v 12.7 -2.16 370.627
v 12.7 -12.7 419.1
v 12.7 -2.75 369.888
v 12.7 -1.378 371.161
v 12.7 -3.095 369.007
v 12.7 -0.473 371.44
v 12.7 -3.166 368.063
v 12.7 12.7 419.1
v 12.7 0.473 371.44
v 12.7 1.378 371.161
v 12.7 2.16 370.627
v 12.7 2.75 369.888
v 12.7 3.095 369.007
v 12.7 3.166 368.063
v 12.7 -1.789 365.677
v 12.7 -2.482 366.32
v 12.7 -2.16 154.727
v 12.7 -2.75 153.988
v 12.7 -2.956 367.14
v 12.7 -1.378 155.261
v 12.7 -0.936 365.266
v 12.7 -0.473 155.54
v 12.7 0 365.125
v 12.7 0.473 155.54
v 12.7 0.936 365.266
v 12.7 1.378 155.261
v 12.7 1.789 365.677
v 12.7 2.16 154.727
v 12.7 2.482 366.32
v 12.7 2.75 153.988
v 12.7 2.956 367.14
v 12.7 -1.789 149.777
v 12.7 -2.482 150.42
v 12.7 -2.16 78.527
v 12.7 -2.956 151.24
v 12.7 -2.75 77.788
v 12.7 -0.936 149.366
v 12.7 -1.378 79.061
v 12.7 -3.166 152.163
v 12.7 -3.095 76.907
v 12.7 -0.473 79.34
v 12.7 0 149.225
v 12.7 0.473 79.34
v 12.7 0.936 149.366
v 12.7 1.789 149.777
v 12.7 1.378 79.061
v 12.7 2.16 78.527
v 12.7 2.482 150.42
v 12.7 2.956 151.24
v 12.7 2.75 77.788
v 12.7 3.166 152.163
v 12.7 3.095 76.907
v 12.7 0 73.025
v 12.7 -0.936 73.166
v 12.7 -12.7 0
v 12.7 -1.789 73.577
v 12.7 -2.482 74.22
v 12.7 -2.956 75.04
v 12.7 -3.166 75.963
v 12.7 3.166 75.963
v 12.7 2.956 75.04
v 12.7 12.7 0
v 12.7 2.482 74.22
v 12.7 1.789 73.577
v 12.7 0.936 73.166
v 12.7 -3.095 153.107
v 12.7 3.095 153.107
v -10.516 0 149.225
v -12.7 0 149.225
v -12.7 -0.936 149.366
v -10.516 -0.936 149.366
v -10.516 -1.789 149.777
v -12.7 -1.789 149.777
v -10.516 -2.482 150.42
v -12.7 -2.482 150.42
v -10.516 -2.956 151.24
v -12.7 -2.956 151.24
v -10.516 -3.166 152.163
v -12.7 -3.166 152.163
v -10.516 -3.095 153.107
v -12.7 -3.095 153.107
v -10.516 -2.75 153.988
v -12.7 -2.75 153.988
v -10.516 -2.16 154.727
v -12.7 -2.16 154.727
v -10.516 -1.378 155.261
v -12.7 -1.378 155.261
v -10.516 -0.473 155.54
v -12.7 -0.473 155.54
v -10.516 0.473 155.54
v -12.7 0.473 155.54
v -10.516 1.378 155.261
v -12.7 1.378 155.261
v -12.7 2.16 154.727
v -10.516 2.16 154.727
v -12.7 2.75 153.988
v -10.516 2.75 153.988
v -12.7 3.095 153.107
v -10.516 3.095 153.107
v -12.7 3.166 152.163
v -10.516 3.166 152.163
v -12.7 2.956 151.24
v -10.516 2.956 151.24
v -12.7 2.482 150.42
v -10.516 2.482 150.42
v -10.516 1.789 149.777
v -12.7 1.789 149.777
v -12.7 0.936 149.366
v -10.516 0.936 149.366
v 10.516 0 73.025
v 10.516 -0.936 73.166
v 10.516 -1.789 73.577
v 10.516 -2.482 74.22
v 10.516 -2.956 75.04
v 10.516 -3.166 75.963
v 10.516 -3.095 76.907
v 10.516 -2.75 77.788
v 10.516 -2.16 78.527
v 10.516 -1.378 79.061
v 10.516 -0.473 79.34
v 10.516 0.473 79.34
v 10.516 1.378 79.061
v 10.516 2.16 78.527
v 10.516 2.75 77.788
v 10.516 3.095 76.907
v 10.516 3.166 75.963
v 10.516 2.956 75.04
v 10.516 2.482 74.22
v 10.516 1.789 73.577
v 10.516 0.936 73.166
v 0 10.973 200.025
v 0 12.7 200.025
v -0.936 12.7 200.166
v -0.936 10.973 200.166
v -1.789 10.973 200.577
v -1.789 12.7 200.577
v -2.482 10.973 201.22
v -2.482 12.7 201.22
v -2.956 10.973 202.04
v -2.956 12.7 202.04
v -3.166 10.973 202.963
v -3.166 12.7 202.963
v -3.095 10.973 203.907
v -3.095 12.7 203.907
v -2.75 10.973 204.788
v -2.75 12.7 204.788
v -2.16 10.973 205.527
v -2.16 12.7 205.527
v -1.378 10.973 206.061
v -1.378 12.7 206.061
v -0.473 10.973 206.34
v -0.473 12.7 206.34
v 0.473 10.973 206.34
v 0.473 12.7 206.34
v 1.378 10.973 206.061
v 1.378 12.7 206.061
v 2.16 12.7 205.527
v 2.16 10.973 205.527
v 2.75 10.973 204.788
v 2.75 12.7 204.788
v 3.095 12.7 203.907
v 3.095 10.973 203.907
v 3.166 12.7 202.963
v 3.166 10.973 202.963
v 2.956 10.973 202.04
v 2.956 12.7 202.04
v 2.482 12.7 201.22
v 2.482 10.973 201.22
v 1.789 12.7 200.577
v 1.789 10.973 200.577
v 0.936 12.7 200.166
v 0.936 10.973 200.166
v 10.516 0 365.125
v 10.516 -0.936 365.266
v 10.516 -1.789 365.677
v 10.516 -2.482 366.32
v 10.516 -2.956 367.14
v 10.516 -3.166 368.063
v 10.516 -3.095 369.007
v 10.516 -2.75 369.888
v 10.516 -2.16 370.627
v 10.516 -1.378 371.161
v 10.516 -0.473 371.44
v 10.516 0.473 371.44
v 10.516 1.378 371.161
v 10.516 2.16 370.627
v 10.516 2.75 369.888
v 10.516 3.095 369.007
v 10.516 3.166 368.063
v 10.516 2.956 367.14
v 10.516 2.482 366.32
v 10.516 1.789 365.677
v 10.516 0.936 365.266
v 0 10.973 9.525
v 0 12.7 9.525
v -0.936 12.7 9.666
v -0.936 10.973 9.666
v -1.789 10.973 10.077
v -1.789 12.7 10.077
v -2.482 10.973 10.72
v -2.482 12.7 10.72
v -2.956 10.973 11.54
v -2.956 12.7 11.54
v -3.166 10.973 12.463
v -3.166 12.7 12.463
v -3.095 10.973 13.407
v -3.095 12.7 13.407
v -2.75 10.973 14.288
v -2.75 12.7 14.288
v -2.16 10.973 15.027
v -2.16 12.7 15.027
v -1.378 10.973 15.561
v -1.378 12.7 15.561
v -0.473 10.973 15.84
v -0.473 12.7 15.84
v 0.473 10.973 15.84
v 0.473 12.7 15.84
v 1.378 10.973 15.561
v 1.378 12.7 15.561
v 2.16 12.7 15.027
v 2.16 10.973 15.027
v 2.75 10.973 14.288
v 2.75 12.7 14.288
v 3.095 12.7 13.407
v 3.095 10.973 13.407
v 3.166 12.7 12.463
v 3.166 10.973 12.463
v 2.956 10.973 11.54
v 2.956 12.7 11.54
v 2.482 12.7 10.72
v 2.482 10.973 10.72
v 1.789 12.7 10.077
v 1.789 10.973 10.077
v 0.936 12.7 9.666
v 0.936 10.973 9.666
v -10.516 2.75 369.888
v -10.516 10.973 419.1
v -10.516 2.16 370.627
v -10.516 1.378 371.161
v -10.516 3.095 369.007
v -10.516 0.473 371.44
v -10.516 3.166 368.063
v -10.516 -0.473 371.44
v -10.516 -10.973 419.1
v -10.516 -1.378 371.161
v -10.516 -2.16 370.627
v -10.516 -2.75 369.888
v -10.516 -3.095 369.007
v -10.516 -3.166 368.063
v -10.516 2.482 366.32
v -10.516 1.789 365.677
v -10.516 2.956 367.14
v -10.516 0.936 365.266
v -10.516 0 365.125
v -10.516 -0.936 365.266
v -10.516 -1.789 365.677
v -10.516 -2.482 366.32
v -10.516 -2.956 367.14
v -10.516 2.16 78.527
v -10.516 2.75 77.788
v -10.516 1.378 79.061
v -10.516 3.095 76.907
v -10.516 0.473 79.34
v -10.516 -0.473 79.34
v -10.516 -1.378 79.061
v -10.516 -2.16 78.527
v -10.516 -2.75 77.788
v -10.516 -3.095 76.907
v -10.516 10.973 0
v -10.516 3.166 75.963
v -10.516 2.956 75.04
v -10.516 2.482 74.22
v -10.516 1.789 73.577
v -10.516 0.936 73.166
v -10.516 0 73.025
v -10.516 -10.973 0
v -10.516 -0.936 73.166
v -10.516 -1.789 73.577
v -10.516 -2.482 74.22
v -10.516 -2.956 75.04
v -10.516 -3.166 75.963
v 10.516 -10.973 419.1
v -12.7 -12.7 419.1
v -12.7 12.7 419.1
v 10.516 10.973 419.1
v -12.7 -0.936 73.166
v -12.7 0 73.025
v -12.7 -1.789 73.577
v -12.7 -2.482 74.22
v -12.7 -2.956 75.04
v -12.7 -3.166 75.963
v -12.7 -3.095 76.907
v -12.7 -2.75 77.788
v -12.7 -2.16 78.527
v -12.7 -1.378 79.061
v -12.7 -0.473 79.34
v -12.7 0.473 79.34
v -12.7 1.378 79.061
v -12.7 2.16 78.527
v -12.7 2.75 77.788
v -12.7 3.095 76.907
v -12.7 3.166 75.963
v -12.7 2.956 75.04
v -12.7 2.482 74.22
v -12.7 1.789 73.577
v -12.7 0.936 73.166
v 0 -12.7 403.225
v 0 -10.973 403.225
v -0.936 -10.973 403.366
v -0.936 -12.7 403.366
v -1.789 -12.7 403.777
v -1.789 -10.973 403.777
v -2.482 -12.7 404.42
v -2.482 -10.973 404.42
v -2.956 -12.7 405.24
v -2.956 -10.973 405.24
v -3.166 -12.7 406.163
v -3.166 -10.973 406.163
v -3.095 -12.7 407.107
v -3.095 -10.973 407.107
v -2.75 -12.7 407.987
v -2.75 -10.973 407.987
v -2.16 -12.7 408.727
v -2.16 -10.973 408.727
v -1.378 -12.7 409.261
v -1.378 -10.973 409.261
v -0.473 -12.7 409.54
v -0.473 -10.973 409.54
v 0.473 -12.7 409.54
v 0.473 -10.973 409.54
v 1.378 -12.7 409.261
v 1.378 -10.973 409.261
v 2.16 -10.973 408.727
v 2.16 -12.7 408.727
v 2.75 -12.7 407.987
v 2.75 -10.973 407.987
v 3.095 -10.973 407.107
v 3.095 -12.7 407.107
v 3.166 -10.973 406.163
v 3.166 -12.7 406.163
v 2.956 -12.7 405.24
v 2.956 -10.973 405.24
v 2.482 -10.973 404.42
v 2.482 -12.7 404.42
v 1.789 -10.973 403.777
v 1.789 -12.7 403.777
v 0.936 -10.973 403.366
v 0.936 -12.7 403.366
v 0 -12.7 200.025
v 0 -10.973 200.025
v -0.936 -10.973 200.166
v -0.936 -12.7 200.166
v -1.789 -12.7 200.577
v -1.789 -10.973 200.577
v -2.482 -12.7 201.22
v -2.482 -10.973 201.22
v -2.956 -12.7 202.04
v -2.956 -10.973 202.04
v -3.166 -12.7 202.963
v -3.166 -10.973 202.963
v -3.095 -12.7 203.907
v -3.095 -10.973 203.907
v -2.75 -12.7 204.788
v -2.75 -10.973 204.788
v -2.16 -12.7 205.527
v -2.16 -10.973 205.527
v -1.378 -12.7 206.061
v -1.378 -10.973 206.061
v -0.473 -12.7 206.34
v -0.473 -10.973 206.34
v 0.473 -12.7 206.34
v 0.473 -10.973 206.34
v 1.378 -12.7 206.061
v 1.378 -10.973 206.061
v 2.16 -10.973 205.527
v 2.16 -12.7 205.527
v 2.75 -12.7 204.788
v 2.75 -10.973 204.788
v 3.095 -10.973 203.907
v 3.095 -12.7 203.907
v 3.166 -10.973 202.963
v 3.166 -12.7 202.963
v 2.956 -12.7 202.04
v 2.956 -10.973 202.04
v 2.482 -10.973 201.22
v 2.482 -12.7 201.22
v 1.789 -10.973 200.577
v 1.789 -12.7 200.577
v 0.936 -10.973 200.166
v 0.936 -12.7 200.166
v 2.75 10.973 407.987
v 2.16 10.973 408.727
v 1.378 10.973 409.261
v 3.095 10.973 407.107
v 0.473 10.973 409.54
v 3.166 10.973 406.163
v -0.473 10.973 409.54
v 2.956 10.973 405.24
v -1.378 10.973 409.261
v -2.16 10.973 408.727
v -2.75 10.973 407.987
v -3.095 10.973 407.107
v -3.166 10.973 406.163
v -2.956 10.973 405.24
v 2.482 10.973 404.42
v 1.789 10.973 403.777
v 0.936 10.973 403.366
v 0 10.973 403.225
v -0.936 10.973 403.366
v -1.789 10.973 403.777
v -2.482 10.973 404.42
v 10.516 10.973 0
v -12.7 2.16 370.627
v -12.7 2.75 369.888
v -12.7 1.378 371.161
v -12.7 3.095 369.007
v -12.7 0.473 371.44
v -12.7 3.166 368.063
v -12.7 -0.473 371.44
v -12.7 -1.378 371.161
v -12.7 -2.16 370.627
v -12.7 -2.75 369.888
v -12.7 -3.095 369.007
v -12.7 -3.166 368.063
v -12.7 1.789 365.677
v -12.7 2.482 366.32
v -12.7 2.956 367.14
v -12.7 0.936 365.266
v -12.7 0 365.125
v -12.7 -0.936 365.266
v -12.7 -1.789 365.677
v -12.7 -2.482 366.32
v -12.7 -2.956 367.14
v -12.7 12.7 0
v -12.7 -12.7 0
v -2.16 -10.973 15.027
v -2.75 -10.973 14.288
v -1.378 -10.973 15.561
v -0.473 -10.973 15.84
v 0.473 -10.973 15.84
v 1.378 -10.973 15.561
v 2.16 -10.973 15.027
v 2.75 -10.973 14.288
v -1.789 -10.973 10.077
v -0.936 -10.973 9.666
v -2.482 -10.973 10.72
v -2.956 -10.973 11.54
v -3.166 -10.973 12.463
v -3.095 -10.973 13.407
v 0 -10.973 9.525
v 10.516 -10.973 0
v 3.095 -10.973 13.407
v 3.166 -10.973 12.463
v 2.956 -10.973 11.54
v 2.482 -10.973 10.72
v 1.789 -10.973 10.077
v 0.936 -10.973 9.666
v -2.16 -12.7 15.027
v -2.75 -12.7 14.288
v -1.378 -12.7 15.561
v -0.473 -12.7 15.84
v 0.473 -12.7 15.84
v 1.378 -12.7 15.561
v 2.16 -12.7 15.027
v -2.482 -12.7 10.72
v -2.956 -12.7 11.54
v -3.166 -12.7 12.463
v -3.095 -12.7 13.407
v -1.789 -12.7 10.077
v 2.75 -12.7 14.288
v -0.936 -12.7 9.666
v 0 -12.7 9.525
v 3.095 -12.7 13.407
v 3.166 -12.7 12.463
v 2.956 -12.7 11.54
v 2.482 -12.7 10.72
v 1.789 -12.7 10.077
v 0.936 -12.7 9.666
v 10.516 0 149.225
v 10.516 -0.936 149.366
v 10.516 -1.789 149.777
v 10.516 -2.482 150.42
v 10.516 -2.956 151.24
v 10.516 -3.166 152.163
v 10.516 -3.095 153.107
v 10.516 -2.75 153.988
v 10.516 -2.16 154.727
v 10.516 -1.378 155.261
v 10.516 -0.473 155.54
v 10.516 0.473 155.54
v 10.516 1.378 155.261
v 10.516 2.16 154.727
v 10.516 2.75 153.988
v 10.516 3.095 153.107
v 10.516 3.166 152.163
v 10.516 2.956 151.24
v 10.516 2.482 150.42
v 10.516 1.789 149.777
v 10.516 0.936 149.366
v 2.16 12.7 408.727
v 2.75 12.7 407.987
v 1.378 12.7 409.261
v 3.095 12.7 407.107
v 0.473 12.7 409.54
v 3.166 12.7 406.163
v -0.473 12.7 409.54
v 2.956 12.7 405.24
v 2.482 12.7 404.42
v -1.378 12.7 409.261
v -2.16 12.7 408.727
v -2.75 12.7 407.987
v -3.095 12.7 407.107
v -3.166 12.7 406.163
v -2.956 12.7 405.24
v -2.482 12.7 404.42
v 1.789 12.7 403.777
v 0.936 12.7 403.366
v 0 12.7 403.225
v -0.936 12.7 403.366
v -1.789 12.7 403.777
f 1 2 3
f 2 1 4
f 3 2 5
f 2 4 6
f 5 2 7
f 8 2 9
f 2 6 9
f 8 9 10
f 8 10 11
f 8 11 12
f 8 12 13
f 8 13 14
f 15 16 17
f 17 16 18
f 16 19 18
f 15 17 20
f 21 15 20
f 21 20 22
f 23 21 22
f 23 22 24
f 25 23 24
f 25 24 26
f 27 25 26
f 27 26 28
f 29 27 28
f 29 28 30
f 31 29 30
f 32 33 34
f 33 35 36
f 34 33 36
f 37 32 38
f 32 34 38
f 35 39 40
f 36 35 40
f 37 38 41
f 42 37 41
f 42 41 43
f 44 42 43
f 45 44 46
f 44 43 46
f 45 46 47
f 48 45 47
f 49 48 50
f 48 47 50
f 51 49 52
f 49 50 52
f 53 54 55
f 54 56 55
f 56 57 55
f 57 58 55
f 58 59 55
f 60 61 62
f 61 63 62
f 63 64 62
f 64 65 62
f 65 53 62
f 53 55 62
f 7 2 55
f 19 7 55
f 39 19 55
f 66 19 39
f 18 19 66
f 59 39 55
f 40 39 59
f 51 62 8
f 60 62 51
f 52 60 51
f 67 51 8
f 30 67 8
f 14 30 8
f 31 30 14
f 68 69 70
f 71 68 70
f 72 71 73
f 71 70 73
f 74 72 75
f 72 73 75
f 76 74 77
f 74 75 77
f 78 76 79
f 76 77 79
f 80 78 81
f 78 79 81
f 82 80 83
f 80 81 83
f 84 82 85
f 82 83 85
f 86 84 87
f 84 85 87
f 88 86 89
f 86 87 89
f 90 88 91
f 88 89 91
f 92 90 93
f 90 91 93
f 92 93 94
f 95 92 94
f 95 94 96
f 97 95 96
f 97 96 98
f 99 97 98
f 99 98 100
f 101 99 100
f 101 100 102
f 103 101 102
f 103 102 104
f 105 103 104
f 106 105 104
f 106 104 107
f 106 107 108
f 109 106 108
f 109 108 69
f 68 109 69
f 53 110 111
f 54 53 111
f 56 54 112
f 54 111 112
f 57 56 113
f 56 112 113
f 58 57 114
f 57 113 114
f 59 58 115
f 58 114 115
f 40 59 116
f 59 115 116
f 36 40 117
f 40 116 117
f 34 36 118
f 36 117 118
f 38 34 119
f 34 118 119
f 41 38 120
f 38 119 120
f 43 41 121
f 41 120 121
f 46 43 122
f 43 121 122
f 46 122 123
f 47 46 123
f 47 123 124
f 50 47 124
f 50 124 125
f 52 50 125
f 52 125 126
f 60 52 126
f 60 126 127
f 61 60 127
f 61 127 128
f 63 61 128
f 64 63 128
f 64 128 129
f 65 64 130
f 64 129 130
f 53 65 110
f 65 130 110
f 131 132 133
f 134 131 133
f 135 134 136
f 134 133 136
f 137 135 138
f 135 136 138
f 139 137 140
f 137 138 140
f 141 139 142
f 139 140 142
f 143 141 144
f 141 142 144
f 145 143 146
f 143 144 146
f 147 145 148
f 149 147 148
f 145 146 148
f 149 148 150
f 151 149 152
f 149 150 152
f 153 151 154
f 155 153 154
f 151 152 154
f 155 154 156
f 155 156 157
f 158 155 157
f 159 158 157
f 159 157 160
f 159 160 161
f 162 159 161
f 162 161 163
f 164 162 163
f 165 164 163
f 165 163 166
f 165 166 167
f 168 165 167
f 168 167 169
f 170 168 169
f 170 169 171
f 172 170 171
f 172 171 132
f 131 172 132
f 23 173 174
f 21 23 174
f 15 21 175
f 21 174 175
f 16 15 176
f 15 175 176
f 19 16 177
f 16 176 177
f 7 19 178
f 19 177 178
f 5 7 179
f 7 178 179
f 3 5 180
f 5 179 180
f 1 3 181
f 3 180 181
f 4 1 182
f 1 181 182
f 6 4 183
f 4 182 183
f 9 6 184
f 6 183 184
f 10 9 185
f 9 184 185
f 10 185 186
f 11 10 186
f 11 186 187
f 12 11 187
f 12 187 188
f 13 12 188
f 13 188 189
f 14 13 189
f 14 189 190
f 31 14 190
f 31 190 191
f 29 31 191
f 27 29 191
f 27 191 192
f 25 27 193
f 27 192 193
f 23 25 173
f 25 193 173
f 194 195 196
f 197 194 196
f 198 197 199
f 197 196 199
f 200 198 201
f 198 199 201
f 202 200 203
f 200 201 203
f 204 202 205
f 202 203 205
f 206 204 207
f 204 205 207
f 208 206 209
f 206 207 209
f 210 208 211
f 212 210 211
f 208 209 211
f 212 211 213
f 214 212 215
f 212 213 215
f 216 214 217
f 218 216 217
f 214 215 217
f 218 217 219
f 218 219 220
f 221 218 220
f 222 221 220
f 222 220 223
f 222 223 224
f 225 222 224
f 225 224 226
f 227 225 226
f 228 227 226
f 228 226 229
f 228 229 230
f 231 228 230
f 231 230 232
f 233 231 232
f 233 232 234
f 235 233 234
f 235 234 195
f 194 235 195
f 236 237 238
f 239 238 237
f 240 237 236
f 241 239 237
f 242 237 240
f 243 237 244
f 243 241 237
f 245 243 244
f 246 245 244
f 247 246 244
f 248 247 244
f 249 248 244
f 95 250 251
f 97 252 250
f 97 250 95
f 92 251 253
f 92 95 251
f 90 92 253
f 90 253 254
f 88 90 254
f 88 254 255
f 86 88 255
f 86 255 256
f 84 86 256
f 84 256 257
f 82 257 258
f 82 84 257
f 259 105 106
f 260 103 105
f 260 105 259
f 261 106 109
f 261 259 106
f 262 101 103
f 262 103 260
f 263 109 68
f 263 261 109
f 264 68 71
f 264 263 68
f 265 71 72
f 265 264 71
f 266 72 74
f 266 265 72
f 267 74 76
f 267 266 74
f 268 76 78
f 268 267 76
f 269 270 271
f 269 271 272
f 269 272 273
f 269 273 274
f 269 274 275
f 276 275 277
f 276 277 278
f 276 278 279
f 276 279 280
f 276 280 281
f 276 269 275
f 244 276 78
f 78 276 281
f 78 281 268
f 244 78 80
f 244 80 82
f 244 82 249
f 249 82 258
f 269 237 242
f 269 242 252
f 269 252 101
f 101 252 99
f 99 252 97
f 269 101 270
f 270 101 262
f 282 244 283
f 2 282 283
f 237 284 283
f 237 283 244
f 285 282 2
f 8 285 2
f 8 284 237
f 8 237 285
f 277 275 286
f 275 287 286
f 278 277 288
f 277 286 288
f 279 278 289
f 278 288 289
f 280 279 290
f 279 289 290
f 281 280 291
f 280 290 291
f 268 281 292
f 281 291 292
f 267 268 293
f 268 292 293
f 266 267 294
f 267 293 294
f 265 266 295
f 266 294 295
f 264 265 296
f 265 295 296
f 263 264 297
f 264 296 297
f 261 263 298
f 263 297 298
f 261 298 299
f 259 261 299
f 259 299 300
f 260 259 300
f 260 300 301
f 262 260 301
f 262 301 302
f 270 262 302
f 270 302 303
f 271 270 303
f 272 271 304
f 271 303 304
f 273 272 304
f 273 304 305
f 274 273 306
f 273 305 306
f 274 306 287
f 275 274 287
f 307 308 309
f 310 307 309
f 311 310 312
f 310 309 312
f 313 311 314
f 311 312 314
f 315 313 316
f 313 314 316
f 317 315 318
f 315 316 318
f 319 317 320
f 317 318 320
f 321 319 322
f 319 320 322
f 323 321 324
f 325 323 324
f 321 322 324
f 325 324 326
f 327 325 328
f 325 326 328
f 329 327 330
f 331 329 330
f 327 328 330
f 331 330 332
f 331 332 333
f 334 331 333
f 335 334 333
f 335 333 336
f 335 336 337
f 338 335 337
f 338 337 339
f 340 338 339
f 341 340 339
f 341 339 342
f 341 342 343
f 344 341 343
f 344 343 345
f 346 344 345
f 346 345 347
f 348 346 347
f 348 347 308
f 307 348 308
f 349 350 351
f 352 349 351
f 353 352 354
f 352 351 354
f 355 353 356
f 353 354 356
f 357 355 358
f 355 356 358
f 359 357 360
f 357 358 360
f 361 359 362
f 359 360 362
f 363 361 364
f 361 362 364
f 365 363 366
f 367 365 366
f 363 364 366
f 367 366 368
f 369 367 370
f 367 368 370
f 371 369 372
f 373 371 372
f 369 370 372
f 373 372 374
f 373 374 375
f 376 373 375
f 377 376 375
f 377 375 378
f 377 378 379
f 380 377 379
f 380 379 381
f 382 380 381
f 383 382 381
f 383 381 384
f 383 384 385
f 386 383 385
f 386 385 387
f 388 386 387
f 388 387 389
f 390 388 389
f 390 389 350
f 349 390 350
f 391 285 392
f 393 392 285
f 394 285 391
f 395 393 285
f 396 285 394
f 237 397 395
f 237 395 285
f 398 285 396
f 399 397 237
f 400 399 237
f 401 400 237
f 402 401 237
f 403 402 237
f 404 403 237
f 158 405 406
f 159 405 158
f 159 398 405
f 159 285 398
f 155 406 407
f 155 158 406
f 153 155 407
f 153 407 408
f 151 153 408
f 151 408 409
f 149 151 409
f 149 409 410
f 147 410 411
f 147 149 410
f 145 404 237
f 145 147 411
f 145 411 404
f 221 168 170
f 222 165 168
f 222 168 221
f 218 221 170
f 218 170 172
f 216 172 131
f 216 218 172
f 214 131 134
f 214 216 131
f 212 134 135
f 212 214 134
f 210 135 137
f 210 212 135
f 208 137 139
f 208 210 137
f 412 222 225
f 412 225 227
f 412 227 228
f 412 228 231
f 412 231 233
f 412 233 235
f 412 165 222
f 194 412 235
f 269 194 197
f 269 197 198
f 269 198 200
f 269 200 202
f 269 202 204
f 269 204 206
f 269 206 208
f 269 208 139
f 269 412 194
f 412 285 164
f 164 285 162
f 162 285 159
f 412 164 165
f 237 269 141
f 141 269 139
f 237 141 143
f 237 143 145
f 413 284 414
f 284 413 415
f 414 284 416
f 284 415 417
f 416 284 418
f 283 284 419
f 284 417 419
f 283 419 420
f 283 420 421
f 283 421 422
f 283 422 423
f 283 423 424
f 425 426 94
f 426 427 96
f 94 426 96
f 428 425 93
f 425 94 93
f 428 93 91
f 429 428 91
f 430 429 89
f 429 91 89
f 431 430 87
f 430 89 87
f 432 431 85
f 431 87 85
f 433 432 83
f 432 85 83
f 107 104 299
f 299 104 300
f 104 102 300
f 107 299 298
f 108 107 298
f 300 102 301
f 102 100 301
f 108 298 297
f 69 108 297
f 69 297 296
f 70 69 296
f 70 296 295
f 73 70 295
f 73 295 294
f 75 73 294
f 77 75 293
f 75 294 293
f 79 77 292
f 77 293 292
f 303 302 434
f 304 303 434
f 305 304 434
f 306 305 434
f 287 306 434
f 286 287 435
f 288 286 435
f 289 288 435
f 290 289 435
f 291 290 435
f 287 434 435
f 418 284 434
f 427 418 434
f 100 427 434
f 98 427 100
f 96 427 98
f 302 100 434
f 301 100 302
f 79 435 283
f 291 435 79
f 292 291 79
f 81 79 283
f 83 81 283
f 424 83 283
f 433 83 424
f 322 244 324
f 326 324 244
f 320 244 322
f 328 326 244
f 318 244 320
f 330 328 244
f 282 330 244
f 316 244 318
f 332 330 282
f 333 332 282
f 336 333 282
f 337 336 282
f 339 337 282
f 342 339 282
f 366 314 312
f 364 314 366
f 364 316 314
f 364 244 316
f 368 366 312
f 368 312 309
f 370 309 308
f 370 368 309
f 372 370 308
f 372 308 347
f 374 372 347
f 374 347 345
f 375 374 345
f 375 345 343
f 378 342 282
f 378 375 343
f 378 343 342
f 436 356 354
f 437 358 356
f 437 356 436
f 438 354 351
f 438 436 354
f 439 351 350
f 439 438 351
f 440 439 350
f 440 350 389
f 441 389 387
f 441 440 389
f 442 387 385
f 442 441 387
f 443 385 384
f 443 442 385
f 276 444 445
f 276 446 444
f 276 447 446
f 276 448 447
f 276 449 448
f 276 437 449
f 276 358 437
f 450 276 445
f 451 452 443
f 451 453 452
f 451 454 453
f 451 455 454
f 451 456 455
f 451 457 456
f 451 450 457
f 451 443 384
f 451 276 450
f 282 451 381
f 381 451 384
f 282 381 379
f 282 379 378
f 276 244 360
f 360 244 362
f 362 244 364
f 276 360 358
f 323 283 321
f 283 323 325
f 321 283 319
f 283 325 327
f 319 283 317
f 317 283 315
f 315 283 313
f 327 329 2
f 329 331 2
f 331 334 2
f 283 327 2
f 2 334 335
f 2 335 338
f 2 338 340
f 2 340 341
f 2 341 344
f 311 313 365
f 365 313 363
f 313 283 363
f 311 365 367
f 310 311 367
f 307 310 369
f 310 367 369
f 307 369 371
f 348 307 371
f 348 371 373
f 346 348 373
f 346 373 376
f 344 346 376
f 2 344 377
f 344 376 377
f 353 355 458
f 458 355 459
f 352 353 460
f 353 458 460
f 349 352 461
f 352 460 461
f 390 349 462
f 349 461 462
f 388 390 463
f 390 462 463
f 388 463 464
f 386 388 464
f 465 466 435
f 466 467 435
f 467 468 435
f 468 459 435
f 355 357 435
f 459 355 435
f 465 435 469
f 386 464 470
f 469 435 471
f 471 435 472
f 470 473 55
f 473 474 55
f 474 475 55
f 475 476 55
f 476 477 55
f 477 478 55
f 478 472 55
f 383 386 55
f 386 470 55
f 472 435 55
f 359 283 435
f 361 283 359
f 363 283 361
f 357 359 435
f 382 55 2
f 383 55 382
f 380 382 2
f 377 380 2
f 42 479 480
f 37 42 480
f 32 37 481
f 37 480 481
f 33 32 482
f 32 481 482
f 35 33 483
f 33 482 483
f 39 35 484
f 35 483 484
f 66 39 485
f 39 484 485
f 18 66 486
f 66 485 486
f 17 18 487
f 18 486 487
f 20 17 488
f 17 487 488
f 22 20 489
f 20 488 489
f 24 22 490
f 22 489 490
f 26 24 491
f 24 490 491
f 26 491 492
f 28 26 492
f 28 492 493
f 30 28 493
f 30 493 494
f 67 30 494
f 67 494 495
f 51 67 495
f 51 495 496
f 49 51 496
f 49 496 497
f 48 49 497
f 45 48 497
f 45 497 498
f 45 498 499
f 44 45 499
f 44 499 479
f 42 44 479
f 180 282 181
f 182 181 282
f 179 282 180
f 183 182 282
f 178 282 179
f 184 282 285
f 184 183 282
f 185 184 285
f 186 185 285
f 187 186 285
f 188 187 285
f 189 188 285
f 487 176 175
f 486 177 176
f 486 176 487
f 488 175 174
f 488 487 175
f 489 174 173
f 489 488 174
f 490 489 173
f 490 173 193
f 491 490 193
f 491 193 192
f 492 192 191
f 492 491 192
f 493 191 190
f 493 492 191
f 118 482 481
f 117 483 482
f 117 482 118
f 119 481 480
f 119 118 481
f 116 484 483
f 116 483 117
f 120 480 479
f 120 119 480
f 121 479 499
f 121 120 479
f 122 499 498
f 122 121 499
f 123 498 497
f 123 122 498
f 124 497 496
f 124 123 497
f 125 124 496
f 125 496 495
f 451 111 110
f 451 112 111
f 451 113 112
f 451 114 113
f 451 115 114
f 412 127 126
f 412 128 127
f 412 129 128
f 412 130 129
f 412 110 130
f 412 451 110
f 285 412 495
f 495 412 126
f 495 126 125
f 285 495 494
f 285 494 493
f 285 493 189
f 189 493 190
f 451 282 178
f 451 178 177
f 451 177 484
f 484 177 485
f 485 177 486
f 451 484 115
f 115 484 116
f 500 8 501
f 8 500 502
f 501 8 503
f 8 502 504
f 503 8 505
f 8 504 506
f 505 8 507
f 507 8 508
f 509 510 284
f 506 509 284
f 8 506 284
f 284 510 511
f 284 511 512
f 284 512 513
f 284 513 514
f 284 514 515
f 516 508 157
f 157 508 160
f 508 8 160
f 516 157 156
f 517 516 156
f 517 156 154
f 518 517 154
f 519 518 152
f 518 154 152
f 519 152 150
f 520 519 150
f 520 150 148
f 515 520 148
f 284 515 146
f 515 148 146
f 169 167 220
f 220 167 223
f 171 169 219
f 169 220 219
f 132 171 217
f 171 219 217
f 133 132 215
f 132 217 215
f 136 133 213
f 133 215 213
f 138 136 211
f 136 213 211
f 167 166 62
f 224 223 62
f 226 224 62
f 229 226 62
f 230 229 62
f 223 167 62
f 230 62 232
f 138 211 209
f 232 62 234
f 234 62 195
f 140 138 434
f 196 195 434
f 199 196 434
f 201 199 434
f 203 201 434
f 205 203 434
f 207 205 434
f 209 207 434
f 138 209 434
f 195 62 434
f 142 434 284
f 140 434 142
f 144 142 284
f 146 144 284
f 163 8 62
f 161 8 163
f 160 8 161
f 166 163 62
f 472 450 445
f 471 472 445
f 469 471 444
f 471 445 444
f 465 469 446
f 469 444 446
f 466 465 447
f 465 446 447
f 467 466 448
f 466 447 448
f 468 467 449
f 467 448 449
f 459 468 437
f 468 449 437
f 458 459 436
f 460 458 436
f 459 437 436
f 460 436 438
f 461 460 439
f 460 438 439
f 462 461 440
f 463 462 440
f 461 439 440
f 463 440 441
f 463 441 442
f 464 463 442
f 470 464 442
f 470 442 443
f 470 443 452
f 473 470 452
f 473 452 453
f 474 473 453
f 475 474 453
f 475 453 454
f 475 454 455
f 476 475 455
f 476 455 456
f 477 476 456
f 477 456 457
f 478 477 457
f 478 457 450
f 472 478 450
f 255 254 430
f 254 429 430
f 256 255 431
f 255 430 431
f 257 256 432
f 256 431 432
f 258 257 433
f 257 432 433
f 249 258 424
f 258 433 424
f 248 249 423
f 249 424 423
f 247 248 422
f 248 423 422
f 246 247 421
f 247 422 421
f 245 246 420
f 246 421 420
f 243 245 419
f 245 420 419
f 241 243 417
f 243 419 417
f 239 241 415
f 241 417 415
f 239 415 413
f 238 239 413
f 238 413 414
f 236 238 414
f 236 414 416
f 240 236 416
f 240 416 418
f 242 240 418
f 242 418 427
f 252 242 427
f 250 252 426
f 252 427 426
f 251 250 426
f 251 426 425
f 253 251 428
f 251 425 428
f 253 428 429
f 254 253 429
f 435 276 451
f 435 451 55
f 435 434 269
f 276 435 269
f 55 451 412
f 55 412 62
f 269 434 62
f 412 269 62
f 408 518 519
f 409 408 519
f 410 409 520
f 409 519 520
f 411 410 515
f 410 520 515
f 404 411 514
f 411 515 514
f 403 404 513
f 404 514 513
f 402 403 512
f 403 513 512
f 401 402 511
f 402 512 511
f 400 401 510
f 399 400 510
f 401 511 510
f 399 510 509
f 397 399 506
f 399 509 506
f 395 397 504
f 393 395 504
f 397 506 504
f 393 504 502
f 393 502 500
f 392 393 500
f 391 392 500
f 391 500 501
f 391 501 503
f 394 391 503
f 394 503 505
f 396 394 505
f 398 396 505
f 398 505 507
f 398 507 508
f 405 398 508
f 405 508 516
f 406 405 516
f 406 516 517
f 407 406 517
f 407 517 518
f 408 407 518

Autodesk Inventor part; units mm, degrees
ref_plane "YZ Plane" through (0, 0, 0) normal (1, 0, 0) x (0, 1, 0)
ref_plane "XZ Plane" through (0, 0, 0) normal (0, 1, 0) x (-1, 0, 0)
ref_plane "XY Plane" through (0, 0, 0) normal (0, 0, 1) x (1, 0, 0)
sketch "Sketch1" plane through (0, 0, 0) normal (0, 0, 1) x (1, 0, 0)
  line L0 (-10.5156, -10.9728) -> (10.5156, -10.9728)
  line L1 (10.5156, -10.9728) -> (10.5156, 10.9728)
  line L2 (10.5156, 10.9728) -> (-10.5156, 10.9728)
  line L3 (-10.5156, 10.9728) -> (-10.5156, -10.9728)
  line L4 (-10.5156, -10.9728) -> (10.5156, 10.9728) construction
  line L5 (10.5156, -10.9728) -> (-10.5156, 10.9728) construction
  line L6 (-12.7, -12.7) -> (12.7, -12.7)
  line L7 (12.7, -12.7) -> (12.7, 12.7)
  line L8 (12.7, 12.7) -> (-12.7, 12.7)
  line L9 (-12.7, 12.7) -> (-12.7, -12.7)
  line L10 (-12.7, -12.7) -> (12.7, 12.7) construction
  line L11 (12.7, -12.7) -> (-12.7, 12.7) construction
  point P0 (0, 0)
  dimension "d0" = 25.4
  dimension "d2" = 25.4
  dimension "d3" = 1.7272
  dimension "d5" = 2.1844
extrude "Extrusion1" add sketch "Sketch1" along normal blind 419.1
sketch "Sketch2" plane through (12.7, -12.7, 0) normal (1, 0, 0) x (0, 0, -1)
  line L0 (0, 0) -> (0, 25.4) projected
  line L1 (0, 25.4) -> (-419.1, 25.4) projected
  line L2 (-419.1, 0) -> (-419.1, 25.4) projected
  point P0 (0, 12.7)
  point P1 (-368.3, 12.7)
  point P2 (-152.4, 12.7)
  point P3 (-76.2, 12.7)
  dimension "d8" = 12.7
  dimension "d9" = 50.8
  dimension "d11" = 76.2
  dimension "d12" = 12.7
  dimension "d13" = 12.7
  dimension "d14" = 76.2
hole "Hole1" at (12.7, 0, 368.3) at (12.7, 0, 152.4) at (12.7, 0, 76.2) direction (-1, 0, 0) diameter 6.35 end through all
sketch "Sketch3" plane through (12.7, -12.7, 0) normal (1, 0, 0) x (0, 0, -1)
  circle A0 centre (-152.4, 12.7) radius 3.175 projected
  circle A1 centre (-368.3, 12.7) radius 3.175 projected
  circle A2 centre (-76.2, 12.7) radius 3.175 projected
  line L0 (0, 0) -> (0, 25.4) projected
  line L1 (0, 25.4) -> (-419.1, 25.4) projected
  line L2 (-419.1, 0) -> (-419.1, 25.4) projected
  line L3 (0, 0) -> (-419.1, 0) projected
  point P0 (0, 12.7)
sketch "Sketch4" plane through (-12.7, -12.7, 0) normal (0, -1, 0) x (1, 0, 0)
  line L0 (0, 0) -> (25.4, 0) projected
  line L1 (25.4, 0) -> (25.4, 419.1) projected
  line L2 (0, 419.1) -> (25.4, 419.1) projected
  line L3 (0, 0) -> (0, 419.1) projected
  point P0 (12.7, 0)
  point P1 (12.7, 406.4)
  point P2 (12.7, 12.7)
  dimension "d22" = 12.7
  dimension "d23" = 12.7
  dimension "d24" = 12.7
  dimension "d25" = 12.7
hole "Hole2" at (0, -12.7, 12.7) at (0, -12.7, 406.4) direction (0, 1, 0) diameter 6.35 end through all
sketch "Sketch5" plane through (-12.7, -12.7, 0) normal (0, -1, 0) x (1, 0, 0)
  line L0 (0, 0) -> (25.4, 0) projected
  line L1 (25.4, 0) -> (25.4, 419.1) projected
  point P0 (12.7, 0)
  point P1 (12.7, 203.2)
  dimension "d33" = 203.2
  dimension "d34" = 12.7
hole "Hole3" at (0, -12.7, 203.2) direction (0, 1, 0) diameter 6.35 end through all
properties part number "BottomSupportBAse" material "Aluminum 6061"
